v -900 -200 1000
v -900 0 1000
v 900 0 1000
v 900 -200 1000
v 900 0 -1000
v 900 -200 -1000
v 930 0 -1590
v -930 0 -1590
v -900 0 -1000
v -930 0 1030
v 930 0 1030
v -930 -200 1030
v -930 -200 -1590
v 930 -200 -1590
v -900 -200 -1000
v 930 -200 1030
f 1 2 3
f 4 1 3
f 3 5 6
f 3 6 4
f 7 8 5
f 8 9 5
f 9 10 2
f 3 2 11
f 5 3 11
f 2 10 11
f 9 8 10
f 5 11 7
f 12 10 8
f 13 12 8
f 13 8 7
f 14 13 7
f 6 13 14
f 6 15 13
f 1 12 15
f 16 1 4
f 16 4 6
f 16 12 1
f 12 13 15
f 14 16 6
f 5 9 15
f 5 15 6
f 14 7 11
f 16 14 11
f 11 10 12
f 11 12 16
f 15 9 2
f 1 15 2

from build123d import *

# Parameters (mm, degrees)
F0_W     = 1860
F0_H     = 2060
F0_W_2   = 1800
F0_H_2   = 2000
F0_H_3   = 560
F1_DEPTH = 200


with BuildPart() as f1:
    # F0 (on Front) → F1 (new body)
    with BuildSketch(Plane.XZ):
        Rectangle(F0_W, F0_H)
        Rectangle(F0_W_2, F0_H_2, mode=Mode.SUBTRACT)
        with Locations((0, -1310)):
            Rectangle(F0_W, F0_H_3)
    extrude(amount=F1_DEPTH)


solid = f1.part
